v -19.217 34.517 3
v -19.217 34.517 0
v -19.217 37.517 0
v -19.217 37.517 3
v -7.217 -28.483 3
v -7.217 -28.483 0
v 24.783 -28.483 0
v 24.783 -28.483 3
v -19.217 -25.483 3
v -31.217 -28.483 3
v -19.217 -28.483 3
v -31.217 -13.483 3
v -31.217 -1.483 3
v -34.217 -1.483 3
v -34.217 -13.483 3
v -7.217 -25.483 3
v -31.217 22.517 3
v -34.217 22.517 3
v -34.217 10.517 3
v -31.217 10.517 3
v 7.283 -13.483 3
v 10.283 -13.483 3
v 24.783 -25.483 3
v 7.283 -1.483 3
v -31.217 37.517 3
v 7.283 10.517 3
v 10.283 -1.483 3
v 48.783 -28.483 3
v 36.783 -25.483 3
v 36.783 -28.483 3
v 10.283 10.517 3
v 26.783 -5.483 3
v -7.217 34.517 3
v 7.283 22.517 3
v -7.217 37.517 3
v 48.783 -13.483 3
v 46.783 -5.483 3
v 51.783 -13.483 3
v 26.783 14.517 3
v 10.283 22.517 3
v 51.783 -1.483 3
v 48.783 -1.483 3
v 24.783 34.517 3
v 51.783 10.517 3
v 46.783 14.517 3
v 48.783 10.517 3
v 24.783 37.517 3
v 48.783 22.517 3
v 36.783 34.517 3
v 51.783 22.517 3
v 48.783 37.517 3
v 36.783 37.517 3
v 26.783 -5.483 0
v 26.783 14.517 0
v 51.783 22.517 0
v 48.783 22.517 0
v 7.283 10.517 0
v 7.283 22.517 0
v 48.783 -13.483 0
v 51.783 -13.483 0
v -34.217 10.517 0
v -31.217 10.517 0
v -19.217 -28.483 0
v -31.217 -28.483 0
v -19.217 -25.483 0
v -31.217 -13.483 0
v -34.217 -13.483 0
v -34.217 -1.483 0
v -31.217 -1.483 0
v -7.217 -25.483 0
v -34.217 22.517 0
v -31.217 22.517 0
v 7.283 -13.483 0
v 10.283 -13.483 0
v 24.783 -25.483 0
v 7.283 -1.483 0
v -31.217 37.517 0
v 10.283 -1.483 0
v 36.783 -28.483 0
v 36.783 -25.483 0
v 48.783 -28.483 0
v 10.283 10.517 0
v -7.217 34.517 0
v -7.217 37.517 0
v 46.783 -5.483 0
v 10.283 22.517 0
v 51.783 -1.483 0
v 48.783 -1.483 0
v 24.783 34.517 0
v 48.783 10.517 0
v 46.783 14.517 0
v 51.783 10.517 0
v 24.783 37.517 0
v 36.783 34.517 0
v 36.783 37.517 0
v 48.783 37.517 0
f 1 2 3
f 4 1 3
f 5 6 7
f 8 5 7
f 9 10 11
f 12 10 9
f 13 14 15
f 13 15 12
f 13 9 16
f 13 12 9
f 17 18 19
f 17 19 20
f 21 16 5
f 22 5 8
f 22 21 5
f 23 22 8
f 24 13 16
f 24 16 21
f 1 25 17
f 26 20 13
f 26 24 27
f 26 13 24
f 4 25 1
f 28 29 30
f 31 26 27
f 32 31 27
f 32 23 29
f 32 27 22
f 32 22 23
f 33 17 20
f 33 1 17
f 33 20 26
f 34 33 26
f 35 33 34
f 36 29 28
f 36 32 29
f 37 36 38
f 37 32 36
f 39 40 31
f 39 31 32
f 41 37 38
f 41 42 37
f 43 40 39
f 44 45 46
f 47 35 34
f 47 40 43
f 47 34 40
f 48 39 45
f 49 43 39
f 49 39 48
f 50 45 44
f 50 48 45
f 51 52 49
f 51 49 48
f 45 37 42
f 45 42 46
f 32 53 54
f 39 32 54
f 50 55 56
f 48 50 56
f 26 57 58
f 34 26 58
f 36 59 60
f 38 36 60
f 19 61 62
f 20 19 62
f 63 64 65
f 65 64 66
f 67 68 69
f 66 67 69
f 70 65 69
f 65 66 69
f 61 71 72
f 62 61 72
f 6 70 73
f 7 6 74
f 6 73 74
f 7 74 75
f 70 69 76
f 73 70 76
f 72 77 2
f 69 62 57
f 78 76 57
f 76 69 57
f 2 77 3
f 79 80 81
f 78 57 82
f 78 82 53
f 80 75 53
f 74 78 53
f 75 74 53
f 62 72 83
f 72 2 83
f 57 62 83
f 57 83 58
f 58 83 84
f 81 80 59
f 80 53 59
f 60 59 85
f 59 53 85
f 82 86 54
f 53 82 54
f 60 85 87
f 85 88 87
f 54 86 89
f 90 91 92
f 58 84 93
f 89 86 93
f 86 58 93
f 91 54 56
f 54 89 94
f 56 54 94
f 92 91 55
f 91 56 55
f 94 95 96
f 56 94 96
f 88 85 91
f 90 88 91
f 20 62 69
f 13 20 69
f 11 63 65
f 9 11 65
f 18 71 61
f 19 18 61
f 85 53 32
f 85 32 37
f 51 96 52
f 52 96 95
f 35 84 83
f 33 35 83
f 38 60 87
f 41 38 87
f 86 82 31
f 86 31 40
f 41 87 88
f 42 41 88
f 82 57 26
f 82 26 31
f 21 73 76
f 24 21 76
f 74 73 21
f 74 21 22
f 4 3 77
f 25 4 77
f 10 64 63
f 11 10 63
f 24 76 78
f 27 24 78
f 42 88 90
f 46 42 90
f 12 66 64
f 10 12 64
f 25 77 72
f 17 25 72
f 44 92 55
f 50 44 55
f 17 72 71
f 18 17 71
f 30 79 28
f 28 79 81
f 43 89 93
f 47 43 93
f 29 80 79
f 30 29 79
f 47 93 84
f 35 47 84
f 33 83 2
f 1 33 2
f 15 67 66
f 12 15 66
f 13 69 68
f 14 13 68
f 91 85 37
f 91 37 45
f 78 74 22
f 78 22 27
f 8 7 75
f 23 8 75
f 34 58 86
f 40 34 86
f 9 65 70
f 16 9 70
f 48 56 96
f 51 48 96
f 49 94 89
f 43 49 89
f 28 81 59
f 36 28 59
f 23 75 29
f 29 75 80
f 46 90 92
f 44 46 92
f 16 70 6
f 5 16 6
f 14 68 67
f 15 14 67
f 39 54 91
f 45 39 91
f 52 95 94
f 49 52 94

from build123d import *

# Parameters (mm, degrees)
ESBO_O1_W                = 3
ESBO_O1_H                = 12
ESBO_O1_W_2              = 20
ESBO_O1_H_2              = 20
RESSALTO_EXTRUS_O1_DEPTH = 3


with BuildPart() as part:
    # Esboço1 → Ressalto-extrusão1 (new body)
    with BuildSketch(Plane.XY):
        Polygon((-31.216896784, 10.517052385), (-31.216896784, -1.482947615), (-34.216896784, -1.482947615), (-34.216896784, -13.482947615), (-31.216896784, -13.482947615), (-31.216896784, -25.482947615), (-31.216896784, -28.482947615), (-19.216896784, -28.482947615), (-19.216896784, -25.482947615), (-7.216896784, -25.482947615), (-7.216896784, -28.482947615), (4.783103216, -28.482947615), (24.783103216, -28.482947615), (24.783103216, -25.482947615), (36.783103216, -25.482947615), (36.783103216, -28.482947615), (48.783103216, -28.482947615), (48.783103216, -25.482947615), (48.783103216, -13.482947615), (51.783103216, -13.482947615), (51.783103216, -1.482947615), (48.783103216, -1.482947615), (48.783103216, 10.517052385), (51.783103216, 10.517052385), (51.783103216, 22.517052385), (48.783103216, 22.517052385), (48.783103216, 34.517052385), (48.783103216, 37.517052385), (36.783103216, 37.517052385), (36.783103216, 34.517052385), (24.783103216, 34.517052385), (24.783103216, 37.517052385), (-1.216896784, 37.517052385), (-7.216896784, 37.517052385), (-7.216896784, 34.517052385), (-19.216896784, 34.517052385), (-19.216896784, 37.517052385), (-31.216896784, 37.517052385), (-31.216896784, 34.517052385), (-31.216896784, 22.517052385), (-34.216896784, 22.517052385), (-34.216896784, 10.517052385), align=None)
        with Locations((8.783103216, 16.517052385)):
            Rectangle(ESBO_O1_W, ESBO_O1_H, mode=Mode.SUBTRACT)
        with Locations((8.783103216, -7.482947615)):
            Rectangle(ESBO_O1_W, ESBO_O1_H, mode=Mode.SUBTRACT)
        with Locations((36.783103216, 4.517052385)):
            Rectangle(ESBO_O1_W_2, ESBO_O1_H_2, mode=Mode.SUBTRACT)
    extrude(amount=RESSALTO_EXTRUS_O1_DEPTH)


solid = part.part
